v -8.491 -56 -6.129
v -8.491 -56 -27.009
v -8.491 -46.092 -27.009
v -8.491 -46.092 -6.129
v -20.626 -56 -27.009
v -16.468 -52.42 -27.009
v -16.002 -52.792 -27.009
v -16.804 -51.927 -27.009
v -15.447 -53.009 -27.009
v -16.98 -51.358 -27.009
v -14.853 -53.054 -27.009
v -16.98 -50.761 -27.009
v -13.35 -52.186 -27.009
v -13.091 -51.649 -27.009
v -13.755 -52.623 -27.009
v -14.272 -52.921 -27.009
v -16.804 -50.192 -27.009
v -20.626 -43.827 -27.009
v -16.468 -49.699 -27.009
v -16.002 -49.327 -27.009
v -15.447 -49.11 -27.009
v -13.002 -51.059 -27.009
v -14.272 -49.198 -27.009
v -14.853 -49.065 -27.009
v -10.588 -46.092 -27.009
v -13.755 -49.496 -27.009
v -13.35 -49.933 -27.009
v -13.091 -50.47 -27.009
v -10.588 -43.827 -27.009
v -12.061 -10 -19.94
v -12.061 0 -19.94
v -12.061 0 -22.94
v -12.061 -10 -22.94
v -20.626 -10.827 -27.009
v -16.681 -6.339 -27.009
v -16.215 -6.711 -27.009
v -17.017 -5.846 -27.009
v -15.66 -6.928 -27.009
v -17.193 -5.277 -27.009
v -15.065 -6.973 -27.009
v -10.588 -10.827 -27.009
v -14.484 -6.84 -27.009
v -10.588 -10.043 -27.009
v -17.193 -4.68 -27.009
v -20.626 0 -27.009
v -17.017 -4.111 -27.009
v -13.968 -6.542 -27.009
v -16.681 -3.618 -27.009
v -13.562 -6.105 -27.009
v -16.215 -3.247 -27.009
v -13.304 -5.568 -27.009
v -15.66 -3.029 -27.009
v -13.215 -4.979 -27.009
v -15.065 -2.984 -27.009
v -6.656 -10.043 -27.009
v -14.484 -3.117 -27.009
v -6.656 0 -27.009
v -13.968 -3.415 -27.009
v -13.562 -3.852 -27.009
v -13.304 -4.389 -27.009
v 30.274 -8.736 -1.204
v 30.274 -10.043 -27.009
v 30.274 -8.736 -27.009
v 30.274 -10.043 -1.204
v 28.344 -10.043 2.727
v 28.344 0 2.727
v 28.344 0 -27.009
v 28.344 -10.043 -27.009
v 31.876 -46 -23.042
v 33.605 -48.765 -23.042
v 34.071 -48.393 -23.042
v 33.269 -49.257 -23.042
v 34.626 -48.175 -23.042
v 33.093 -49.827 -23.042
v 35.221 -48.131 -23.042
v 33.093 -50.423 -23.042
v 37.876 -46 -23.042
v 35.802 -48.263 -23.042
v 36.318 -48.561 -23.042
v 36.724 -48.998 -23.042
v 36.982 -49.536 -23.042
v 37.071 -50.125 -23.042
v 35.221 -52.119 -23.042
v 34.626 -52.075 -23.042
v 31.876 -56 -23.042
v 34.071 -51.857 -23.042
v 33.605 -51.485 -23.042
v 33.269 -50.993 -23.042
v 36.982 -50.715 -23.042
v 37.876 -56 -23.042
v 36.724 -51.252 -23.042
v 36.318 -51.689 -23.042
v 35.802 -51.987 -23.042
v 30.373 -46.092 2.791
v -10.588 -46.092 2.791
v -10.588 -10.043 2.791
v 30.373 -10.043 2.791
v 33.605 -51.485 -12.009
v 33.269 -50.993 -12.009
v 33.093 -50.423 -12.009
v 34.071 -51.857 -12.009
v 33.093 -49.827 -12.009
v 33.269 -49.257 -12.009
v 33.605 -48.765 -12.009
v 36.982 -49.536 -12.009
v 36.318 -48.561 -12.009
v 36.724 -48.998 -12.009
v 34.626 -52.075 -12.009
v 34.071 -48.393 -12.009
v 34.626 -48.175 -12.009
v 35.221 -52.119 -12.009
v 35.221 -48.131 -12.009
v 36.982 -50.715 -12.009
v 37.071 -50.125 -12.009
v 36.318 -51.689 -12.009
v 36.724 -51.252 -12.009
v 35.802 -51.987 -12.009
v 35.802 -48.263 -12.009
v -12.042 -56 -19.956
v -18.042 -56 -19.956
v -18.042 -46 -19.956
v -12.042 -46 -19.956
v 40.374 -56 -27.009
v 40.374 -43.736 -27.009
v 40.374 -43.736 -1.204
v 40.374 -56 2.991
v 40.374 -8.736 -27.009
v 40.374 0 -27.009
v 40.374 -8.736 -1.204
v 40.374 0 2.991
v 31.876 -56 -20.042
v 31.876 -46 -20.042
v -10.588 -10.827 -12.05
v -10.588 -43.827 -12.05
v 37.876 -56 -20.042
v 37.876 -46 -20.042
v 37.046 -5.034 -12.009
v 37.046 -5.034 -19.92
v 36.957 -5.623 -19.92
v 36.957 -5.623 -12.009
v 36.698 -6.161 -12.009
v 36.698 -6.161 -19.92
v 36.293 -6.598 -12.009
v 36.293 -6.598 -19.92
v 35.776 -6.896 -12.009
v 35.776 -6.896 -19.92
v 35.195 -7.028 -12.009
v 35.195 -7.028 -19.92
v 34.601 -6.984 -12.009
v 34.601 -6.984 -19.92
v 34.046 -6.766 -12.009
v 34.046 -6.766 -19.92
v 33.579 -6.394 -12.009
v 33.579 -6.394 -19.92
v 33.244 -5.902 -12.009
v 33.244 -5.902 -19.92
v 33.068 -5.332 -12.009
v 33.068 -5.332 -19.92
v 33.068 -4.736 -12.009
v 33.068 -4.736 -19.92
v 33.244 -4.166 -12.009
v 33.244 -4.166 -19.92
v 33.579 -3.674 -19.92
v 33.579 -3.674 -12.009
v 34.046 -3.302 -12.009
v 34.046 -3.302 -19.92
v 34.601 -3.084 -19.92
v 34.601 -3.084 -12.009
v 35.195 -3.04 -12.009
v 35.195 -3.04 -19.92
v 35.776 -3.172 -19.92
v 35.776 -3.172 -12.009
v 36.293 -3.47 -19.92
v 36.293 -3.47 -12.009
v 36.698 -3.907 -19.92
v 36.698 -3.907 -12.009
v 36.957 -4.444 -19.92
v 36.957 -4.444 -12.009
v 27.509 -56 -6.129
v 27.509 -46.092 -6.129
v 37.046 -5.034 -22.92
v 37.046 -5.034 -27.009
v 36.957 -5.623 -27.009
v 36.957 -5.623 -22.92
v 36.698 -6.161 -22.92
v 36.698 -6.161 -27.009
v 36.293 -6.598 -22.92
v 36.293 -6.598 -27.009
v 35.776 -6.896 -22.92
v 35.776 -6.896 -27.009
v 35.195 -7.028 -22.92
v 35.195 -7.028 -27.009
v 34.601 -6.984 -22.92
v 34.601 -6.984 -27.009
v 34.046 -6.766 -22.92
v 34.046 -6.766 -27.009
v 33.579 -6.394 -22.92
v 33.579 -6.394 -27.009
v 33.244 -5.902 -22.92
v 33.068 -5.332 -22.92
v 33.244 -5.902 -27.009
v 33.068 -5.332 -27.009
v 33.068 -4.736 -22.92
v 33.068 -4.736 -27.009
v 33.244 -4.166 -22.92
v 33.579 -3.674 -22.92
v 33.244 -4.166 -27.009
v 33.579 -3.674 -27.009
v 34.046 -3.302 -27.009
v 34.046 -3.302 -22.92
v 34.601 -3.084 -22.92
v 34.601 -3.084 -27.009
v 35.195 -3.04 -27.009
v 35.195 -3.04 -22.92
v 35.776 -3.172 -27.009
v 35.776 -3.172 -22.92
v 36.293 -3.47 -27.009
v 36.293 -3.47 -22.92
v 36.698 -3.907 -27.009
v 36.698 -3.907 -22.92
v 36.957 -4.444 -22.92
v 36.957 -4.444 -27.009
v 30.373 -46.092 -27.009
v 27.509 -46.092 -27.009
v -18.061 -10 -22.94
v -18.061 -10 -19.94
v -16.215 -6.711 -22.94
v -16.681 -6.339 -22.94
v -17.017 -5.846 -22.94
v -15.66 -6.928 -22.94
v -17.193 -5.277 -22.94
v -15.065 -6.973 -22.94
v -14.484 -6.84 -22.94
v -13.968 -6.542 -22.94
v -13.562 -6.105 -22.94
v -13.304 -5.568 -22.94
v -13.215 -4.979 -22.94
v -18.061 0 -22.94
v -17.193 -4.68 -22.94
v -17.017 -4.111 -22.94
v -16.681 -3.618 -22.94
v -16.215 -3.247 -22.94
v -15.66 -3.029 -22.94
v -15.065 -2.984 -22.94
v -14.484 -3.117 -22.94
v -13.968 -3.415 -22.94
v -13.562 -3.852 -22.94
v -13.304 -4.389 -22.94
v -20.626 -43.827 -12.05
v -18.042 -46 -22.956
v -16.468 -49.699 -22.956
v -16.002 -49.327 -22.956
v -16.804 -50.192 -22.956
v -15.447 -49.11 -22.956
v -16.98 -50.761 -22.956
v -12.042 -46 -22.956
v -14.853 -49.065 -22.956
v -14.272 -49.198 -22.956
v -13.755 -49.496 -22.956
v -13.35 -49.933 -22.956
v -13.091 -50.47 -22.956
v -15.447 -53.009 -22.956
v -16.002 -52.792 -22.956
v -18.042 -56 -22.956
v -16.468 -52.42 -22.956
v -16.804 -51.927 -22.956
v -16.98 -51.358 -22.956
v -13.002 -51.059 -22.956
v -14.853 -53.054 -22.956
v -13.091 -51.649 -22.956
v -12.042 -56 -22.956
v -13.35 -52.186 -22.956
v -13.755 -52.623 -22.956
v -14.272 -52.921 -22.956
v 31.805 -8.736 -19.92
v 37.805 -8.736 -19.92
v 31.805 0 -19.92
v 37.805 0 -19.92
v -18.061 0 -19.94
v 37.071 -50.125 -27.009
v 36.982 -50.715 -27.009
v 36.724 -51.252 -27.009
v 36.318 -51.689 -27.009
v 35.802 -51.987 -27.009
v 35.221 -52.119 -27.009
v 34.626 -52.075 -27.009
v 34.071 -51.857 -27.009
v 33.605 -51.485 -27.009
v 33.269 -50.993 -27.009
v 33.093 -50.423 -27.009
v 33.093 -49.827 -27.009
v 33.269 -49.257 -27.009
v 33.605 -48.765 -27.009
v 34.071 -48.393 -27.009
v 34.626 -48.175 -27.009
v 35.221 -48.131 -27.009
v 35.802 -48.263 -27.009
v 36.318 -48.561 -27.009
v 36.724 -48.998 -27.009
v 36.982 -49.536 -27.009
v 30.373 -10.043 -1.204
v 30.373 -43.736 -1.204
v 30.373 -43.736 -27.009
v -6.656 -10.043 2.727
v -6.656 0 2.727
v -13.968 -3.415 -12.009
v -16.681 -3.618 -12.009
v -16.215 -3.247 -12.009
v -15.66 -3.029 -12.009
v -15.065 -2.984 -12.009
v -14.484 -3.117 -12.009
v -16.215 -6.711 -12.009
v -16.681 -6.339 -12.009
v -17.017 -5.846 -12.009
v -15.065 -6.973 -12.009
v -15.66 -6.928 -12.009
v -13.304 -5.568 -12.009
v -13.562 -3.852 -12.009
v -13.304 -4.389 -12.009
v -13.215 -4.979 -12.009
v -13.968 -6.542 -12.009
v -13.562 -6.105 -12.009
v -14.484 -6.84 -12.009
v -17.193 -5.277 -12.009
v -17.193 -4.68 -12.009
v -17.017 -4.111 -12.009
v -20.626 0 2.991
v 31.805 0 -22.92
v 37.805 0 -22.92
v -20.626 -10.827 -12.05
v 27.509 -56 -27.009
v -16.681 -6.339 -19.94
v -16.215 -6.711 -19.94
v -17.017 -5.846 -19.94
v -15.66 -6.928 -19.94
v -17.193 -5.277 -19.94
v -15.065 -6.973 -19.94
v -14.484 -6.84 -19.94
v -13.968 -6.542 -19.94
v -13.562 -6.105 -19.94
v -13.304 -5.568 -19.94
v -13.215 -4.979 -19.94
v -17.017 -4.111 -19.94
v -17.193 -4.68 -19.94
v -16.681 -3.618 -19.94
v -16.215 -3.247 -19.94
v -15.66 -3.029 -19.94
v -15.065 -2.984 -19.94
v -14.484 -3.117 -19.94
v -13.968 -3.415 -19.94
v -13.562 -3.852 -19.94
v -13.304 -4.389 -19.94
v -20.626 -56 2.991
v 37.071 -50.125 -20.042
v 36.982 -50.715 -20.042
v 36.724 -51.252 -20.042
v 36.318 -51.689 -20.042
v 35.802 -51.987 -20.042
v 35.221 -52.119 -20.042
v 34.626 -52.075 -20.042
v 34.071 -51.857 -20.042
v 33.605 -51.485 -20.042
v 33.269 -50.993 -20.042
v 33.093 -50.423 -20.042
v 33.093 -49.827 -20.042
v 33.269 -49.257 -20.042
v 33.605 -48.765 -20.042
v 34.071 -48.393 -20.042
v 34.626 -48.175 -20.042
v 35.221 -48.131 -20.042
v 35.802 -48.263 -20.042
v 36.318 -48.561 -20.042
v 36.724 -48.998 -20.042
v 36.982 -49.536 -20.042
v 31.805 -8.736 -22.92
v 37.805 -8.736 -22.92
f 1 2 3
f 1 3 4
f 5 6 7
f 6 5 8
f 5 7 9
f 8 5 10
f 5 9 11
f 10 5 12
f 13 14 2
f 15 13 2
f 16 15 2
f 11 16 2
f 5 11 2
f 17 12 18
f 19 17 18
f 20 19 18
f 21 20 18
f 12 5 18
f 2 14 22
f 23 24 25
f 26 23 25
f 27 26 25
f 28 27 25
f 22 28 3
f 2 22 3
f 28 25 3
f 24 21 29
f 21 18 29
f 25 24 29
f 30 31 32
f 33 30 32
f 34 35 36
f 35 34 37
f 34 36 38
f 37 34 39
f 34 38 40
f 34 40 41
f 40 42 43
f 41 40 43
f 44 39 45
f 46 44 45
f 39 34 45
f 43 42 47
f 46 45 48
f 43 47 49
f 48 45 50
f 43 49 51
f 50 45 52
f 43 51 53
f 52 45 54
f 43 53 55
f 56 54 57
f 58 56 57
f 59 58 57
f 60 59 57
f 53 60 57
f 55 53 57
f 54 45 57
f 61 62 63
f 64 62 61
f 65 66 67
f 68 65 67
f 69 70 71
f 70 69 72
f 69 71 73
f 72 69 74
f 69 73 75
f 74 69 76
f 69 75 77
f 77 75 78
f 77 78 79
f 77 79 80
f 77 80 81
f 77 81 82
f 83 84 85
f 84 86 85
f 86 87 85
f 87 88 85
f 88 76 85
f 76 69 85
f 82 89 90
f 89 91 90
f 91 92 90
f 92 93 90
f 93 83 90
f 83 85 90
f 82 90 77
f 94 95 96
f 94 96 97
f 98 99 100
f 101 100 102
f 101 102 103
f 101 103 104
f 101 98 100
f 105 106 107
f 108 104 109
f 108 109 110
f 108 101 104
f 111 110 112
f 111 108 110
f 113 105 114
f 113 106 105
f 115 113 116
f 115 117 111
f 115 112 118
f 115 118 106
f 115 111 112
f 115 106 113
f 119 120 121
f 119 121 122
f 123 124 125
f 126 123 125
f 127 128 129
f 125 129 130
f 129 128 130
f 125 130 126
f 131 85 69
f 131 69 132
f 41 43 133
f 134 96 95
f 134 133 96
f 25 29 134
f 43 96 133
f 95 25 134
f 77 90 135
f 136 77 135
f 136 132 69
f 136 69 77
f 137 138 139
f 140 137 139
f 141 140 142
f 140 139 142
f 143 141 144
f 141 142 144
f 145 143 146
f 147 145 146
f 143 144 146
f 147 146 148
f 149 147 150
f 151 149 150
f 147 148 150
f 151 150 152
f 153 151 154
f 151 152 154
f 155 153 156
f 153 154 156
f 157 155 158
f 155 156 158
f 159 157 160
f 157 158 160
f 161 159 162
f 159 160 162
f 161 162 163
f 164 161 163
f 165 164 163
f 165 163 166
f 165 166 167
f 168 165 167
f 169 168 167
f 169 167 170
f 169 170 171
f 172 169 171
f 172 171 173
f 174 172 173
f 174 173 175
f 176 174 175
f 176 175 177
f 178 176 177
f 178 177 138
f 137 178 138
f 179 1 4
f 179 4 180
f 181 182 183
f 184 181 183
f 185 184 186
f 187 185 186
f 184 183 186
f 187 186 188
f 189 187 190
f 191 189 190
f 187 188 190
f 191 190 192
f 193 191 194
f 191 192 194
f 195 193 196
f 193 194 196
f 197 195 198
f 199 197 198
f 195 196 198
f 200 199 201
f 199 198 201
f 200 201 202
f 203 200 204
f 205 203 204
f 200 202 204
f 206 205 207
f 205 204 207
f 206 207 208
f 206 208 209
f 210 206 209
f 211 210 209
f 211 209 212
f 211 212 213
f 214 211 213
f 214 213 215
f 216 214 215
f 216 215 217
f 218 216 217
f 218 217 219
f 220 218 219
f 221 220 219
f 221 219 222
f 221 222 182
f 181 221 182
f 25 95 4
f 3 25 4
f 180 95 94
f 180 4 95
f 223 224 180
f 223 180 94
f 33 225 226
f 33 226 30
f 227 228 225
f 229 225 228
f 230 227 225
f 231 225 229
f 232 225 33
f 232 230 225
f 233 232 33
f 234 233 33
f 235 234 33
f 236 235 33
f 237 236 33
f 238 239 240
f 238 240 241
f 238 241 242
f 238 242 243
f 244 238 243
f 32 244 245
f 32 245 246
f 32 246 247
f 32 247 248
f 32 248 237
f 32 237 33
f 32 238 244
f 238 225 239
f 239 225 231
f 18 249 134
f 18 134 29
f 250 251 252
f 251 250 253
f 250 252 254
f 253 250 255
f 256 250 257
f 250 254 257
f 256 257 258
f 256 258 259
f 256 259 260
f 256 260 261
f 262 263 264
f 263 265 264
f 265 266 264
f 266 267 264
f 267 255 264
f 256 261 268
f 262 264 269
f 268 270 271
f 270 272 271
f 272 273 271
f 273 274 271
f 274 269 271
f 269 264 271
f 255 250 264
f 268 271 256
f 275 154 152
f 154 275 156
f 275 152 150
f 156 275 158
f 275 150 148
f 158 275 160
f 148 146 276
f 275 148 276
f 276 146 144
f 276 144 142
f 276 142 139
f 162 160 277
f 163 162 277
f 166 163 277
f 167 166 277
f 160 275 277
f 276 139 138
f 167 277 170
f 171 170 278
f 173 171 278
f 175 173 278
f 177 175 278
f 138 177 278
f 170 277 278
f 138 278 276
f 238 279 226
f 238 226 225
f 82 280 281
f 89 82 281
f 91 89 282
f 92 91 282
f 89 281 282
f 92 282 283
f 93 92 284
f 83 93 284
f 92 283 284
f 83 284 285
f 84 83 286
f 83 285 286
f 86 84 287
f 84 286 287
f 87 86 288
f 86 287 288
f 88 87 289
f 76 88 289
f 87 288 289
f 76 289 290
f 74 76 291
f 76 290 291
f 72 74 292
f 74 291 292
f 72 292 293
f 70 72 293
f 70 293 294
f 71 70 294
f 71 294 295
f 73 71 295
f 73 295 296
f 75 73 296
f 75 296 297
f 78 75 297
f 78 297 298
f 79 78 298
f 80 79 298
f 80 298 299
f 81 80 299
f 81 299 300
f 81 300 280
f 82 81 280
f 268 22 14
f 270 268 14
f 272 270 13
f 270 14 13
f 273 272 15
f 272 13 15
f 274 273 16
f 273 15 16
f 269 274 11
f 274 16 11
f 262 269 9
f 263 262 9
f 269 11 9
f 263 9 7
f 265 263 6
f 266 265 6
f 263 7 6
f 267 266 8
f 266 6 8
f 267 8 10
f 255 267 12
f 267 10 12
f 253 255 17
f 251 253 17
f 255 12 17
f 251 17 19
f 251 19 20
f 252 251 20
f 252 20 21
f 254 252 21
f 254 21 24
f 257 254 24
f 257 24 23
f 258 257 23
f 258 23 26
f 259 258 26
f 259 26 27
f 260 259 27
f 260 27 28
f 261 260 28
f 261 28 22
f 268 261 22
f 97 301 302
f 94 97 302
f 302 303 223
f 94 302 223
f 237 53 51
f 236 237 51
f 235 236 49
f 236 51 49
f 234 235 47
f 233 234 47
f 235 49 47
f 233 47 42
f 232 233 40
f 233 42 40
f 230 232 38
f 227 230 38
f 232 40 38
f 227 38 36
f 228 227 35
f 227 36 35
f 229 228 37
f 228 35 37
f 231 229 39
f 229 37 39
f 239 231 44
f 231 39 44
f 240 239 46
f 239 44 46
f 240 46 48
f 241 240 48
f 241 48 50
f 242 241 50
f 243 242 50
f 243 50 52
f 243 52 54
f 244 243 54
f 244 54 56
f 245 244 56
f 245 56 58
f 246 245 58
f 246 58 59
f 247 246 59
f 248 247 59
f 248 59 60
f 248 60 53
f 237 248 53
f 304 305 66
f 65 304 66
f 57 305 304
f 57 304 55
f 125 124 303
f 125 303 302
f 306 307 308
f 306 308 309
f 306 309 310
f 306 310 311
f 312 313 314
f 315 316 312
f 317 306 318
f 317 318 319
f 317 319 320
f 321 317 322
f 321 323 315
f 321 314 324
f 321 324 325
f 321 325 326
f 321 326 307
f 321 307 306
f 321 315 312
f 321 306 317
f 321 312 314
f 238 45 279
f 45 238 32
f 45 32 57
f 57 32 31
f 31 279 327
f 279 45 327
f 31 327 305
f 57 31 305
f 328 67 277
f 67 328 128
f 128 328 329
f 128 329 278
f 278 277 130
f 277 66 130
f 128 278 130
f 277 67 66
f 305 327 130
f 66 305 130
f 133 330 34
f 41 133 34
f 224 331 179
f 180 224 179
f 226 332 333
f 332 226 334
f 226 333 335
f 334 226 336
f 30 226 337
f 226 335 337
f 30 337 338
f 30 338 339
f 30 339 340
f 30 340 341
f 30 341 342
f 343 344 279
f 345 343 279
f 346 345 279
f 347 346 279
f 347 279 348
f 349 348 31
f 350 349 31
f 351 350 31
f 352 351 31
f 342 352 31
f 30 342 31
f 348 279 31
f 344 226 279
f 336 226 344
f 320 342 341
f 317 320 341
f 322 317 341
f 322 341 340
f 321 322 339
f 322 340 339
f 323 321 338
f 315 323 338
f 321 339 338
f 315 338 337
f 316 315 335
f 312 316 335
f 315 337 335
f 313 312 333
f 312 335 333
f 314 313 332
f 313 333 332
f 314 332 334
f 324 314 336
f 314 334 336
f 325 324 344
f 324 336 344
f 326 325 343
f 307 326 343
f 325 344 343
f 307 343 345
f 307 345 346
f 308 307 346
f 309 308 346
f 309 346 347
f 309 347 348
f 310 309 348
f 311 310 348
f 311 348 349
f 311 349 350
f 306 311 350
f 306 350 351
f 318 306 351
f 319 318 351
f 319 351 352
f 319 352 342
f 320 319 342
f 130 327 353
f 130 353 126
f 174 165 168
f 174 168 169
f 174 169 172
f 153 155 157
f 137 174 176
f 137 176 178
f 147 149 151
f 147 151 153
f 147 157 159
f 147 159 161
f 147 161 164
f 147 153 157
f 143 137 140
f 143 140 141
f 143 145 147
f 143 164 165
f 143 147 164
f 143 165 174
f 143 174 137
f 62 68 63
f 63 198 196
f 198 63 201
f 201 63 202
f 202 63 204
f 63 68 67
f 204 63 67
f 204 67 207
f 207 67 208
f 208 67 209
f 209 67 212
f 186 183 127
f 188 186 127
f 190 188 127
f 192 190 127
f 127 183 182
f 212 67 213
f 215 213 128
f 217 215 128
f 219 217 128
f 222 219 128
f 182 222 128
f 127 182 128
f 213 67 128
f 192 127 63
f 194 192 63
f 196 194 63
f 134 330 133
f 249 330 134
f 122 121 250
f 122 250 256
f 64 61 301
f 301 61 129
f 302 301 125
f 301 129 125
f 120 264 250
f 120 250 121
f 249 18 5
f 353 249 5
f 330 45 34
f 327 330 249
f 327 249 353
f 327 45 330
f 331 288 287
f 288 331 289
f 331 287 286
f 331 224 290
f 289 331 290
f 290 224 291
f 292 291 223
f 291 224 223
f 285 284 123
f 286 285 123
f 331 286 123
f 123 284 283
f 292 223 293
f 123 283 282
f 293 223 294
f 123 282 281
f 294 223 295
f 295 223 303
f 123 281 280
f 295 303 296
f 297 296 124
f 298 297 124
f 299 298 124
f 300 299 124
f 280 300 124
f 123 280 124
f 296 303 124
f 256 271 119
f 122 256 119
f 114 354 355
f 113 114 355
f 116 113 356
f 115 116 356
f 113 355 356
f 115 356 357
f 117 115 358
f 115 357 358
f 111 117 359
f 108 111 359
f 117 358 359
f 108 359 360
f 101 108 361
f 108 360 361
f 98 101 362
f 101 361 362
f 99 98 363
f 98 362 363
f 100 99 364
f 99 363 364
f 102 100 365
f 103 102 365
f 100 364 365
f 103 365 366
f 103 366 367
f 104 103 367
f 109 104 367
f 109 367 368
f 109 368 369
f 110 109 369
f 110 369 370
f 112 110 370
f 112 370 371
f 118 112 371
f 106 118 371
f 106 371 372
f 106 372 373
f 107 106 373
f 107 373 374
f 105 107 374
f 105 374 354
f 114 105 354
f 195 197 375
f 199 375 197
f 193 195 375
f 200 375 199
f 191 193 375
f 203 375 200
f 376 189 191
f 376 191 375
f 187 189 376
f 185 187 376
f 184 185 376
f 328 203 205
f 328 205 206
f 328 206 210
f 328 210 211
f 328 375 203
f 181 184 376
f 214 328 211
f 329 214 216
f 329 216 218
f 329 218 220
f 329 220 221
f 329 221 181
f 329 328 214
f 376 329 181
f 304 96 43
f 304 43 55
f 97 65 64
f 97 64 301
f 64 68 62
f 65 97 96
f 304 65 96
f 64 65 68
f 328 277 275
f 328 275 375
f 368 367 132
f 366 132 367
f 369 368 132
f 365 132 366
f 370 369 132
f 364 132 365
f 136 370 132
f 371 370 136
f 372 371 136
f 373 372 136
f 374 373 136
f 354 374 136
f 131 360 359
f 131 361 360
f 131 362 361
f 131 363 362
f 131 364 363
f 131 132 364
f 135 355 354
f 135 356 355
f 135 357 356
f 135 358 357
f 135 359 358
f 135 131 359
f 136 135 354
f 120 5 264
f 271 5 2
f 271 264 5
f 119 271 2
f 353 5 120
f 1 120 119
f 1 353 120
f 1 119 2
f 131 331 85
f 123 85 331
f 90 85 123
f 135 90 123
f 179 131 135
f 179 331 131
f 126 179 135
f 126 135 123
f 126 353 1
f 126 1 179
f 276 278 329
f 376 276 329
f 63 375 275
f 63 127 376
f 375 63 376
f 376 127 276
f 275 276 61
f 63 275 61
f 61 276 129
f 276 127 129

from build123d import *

# Parameters (mm, degrees)
SKETCH_W        = 61
SKETCH_H        = 30
PAD_DEPTH       = 56
SKETCH003_W     = 40.961635
SKETCH003_H     = 36.049525
POCKET_DEPTH    = 29.8
SKETCH004_W     = 36
SKETCH004_H     = 21
POCKET001_DEPTH = 10
SKETCH005_W     = 26
SKETCH005_H     = 35
POCKET002_DEPTH = 10.1
SKETCH006_W     = 35
SKETCH006_H     = 29.765225
POCKET003_DEPTH = 10.1
SKETCH007_W     = 15
SKETCH007_H     = 33
POCKET004_DEPTH = 10.1
SKETCH009_R     = 2
POCKET005_DEPTH = 5
SKETCH010_R     = 2
POCKET006_DEPTH = 15
SKETCH011_R     = 2
POCKET007_DEPTH = 15
SKETCH012_R     = 2
POCKET008_DEPTH = 15
SKETCH013_W     = 6
SKETCH013_H     = 3
POCKET009_DEPTH = 10
SKETCH014_W     = 6
SKETCH014_H     = 3
POCKET010_DEPTH = 10
SKETCH015_W     = 6
SKETCH015_H     = 3
POCKET011_DEPTH = 10
SKETCH016_W     = 6
SKETCH016_H     = 3
POCKET012_DEPTH = 10


with BuildPart() as part:
    # Sketch → Pad (new body)
    with BuildSketch(Plane.XZ):
        with Locations((9.874064, -12.009427)):
            Rectangle(SKETCH_W, SKETCH_H)
    extrude(amount=PAD_DEPTH)

    # Sketch003 → Pocket (cut)
    with BuildSketch(Plane(origin=(0, 0, -27.009427), x_dir=(1, 0, 0), z_dir=(0, 0, -1))):
        with Locations((9.892656, 28.067419)):
            Rectangle(SKETCH003_W, SKETCH003_H)
    extrude(amount=-POCKET_DEPTH, mode=Mode.SUBTRACT)

    # Sketch004 → Pocket001 (cut)
    with BuildSketch(Plane.XZ.offset(56)):
        with Locations((9.508816, -16.629091)):
            Rectangle(SKETCH004_W, SKETCH004_H)
    extrude(amount=-POCKET001_DEPTH, mode=Mode.SUBTRACT)

    # Sketch005 → Pocket002 (cut)
    with BuildSketch(Plane(origin=(40.374064, 0, 0), x_dir=(0, 0, 1), z_dir=(1, 0, 0))):
        with Locations((-14.2042, 26.235572)):
            Rectangle(SKETCH005_W, SKETCH005_H)
    extrude(amount=-POCKET002_DEPTH, mode=Mode.SUBTRACT)

    # Sketch006 → Pocket003 (cut)
    with BuildSketch(Plane(origin=(0, 0, 0), x_dir=(1, 0, 0), z_dir=(0, 1, 0))):
        with Locations((10.843993, 12.155679)):
            Rectangle(SKETCH006_W, SKETCH006_H)
    extrude(amount=-POCKET003_DEPTH, mode=Mode.SUBTRACT)

    # Sketch007 → Pocket004 (cut)
    with BuildSketch(Plane(origin=(-20.625936, 0, 0), x_dir=(0, 0, -1), z_dir=(-1, 0, 0))):
        with Locations((19.549922, 27.327213)):
            Rectangle(SKETCH007_W, SKETCH007_H)
    extrude(amount=-POCKET004_DEPTH, mode=Mode.SUBTRACT)

    # Sketch009 → Pocket005 (cut)
    with BuildSketch(Plane(origin=(0, 0, -27.009427), x_dir=(1, 0, 0), z_dir=(0, 0, -1))):
        with Locations((-15.002267, 51.059483)):
            Circle(SKETCH009_R)
    extrude(amount=-POCKET005_DEPTH, mode=Mode.SUBTRACT)

    # Sketch010 → Pocket006 (cut)
    with BuildSketch(Plane(origin=(0, 0, -27.009427), x_dir=(1, 0, 0), z_dir=(0, 0, -1))):
        with Locations((35.071098, 50.12505)):
            Circle(SKETCH010_R)
    extrude(amount=-POCKET006_DEPTH, mode=Mode.SUBTRACT)

    # Sketch011 → Pocket007 (cut)
    with BuildSketch(Plane(origin=(0, 0, -27.009427), x_dir=(1, 0, 0), z_dir=(0, 0, -1))):
        with Locations((-15.214926, 4.978576)):
            Circle(SKETCH011_R)
    extrude(amount=-POCKET007_DEPTH, mode=Mode.SUBTRACT)

    # Sketch012 → Pocket008 (cut)
    with BuildSketch(Plane(origin=(0, 0, -27.009427), x_dir=(1, 0, 0), z_dir=(0, 0, -1))):
        with Locations((35.045578, 5.033976)):
            Circle(SKETCH012_R)
    extrude(amount=-POCKET008_DEPTH, mode=Mode.SUBTRACT)

    # Sketch013 → Pocket009 (cut)
    with BuildSketch(Plane.XZ.offset(56)):
        with Locations((34.876442, -21.54185)):
            Rectangle(SKETCH013_W, SKETCH013_H)
    extrude(amount=-POCKET009_DEPTH, mode=Mode.SUBTRACT)

    # Sketch014 → Pocket010 (cut)
    with BuildSketch(Plane.XZ.offset(56)):
        with Locations((-15.041702, -21.455929)):
            Rectangle(SKETCH014_W, SKETCH014_H)
    extrude(amount=-POCKET010_DEPTH, mode=Mode.SUBTRACT)

    # Sketch015 → Pocket011 (cut)
    with BuildSketch(Plane(origin=(0, 0, 0), x_dir=(1, 0, 0), z_dir=(0, 1, 0))):
        with Locations((-15.06067, 21.44039)):
            Rectangle(SKETCH015_W, SKETCH015_H)
    extrude(amount=-POCKET011_DEPTH, mode=Mode.SUBTRACT)

    # Sketch016 → Pocket012 (cut)
    with BuildSketch(Plane(origin=(0, 0, 0), x_dir=(1, 0, 0), z_dir=(0, 1, 0))):
        with Locations((34.804899, 21.419892)):
            Rectangle(SKETCH016_W, SKETCH016_H)
    extrude(amount=-POCKET012_DEPTH, mode=Mode.SUBTRACT)


solid = part.part
